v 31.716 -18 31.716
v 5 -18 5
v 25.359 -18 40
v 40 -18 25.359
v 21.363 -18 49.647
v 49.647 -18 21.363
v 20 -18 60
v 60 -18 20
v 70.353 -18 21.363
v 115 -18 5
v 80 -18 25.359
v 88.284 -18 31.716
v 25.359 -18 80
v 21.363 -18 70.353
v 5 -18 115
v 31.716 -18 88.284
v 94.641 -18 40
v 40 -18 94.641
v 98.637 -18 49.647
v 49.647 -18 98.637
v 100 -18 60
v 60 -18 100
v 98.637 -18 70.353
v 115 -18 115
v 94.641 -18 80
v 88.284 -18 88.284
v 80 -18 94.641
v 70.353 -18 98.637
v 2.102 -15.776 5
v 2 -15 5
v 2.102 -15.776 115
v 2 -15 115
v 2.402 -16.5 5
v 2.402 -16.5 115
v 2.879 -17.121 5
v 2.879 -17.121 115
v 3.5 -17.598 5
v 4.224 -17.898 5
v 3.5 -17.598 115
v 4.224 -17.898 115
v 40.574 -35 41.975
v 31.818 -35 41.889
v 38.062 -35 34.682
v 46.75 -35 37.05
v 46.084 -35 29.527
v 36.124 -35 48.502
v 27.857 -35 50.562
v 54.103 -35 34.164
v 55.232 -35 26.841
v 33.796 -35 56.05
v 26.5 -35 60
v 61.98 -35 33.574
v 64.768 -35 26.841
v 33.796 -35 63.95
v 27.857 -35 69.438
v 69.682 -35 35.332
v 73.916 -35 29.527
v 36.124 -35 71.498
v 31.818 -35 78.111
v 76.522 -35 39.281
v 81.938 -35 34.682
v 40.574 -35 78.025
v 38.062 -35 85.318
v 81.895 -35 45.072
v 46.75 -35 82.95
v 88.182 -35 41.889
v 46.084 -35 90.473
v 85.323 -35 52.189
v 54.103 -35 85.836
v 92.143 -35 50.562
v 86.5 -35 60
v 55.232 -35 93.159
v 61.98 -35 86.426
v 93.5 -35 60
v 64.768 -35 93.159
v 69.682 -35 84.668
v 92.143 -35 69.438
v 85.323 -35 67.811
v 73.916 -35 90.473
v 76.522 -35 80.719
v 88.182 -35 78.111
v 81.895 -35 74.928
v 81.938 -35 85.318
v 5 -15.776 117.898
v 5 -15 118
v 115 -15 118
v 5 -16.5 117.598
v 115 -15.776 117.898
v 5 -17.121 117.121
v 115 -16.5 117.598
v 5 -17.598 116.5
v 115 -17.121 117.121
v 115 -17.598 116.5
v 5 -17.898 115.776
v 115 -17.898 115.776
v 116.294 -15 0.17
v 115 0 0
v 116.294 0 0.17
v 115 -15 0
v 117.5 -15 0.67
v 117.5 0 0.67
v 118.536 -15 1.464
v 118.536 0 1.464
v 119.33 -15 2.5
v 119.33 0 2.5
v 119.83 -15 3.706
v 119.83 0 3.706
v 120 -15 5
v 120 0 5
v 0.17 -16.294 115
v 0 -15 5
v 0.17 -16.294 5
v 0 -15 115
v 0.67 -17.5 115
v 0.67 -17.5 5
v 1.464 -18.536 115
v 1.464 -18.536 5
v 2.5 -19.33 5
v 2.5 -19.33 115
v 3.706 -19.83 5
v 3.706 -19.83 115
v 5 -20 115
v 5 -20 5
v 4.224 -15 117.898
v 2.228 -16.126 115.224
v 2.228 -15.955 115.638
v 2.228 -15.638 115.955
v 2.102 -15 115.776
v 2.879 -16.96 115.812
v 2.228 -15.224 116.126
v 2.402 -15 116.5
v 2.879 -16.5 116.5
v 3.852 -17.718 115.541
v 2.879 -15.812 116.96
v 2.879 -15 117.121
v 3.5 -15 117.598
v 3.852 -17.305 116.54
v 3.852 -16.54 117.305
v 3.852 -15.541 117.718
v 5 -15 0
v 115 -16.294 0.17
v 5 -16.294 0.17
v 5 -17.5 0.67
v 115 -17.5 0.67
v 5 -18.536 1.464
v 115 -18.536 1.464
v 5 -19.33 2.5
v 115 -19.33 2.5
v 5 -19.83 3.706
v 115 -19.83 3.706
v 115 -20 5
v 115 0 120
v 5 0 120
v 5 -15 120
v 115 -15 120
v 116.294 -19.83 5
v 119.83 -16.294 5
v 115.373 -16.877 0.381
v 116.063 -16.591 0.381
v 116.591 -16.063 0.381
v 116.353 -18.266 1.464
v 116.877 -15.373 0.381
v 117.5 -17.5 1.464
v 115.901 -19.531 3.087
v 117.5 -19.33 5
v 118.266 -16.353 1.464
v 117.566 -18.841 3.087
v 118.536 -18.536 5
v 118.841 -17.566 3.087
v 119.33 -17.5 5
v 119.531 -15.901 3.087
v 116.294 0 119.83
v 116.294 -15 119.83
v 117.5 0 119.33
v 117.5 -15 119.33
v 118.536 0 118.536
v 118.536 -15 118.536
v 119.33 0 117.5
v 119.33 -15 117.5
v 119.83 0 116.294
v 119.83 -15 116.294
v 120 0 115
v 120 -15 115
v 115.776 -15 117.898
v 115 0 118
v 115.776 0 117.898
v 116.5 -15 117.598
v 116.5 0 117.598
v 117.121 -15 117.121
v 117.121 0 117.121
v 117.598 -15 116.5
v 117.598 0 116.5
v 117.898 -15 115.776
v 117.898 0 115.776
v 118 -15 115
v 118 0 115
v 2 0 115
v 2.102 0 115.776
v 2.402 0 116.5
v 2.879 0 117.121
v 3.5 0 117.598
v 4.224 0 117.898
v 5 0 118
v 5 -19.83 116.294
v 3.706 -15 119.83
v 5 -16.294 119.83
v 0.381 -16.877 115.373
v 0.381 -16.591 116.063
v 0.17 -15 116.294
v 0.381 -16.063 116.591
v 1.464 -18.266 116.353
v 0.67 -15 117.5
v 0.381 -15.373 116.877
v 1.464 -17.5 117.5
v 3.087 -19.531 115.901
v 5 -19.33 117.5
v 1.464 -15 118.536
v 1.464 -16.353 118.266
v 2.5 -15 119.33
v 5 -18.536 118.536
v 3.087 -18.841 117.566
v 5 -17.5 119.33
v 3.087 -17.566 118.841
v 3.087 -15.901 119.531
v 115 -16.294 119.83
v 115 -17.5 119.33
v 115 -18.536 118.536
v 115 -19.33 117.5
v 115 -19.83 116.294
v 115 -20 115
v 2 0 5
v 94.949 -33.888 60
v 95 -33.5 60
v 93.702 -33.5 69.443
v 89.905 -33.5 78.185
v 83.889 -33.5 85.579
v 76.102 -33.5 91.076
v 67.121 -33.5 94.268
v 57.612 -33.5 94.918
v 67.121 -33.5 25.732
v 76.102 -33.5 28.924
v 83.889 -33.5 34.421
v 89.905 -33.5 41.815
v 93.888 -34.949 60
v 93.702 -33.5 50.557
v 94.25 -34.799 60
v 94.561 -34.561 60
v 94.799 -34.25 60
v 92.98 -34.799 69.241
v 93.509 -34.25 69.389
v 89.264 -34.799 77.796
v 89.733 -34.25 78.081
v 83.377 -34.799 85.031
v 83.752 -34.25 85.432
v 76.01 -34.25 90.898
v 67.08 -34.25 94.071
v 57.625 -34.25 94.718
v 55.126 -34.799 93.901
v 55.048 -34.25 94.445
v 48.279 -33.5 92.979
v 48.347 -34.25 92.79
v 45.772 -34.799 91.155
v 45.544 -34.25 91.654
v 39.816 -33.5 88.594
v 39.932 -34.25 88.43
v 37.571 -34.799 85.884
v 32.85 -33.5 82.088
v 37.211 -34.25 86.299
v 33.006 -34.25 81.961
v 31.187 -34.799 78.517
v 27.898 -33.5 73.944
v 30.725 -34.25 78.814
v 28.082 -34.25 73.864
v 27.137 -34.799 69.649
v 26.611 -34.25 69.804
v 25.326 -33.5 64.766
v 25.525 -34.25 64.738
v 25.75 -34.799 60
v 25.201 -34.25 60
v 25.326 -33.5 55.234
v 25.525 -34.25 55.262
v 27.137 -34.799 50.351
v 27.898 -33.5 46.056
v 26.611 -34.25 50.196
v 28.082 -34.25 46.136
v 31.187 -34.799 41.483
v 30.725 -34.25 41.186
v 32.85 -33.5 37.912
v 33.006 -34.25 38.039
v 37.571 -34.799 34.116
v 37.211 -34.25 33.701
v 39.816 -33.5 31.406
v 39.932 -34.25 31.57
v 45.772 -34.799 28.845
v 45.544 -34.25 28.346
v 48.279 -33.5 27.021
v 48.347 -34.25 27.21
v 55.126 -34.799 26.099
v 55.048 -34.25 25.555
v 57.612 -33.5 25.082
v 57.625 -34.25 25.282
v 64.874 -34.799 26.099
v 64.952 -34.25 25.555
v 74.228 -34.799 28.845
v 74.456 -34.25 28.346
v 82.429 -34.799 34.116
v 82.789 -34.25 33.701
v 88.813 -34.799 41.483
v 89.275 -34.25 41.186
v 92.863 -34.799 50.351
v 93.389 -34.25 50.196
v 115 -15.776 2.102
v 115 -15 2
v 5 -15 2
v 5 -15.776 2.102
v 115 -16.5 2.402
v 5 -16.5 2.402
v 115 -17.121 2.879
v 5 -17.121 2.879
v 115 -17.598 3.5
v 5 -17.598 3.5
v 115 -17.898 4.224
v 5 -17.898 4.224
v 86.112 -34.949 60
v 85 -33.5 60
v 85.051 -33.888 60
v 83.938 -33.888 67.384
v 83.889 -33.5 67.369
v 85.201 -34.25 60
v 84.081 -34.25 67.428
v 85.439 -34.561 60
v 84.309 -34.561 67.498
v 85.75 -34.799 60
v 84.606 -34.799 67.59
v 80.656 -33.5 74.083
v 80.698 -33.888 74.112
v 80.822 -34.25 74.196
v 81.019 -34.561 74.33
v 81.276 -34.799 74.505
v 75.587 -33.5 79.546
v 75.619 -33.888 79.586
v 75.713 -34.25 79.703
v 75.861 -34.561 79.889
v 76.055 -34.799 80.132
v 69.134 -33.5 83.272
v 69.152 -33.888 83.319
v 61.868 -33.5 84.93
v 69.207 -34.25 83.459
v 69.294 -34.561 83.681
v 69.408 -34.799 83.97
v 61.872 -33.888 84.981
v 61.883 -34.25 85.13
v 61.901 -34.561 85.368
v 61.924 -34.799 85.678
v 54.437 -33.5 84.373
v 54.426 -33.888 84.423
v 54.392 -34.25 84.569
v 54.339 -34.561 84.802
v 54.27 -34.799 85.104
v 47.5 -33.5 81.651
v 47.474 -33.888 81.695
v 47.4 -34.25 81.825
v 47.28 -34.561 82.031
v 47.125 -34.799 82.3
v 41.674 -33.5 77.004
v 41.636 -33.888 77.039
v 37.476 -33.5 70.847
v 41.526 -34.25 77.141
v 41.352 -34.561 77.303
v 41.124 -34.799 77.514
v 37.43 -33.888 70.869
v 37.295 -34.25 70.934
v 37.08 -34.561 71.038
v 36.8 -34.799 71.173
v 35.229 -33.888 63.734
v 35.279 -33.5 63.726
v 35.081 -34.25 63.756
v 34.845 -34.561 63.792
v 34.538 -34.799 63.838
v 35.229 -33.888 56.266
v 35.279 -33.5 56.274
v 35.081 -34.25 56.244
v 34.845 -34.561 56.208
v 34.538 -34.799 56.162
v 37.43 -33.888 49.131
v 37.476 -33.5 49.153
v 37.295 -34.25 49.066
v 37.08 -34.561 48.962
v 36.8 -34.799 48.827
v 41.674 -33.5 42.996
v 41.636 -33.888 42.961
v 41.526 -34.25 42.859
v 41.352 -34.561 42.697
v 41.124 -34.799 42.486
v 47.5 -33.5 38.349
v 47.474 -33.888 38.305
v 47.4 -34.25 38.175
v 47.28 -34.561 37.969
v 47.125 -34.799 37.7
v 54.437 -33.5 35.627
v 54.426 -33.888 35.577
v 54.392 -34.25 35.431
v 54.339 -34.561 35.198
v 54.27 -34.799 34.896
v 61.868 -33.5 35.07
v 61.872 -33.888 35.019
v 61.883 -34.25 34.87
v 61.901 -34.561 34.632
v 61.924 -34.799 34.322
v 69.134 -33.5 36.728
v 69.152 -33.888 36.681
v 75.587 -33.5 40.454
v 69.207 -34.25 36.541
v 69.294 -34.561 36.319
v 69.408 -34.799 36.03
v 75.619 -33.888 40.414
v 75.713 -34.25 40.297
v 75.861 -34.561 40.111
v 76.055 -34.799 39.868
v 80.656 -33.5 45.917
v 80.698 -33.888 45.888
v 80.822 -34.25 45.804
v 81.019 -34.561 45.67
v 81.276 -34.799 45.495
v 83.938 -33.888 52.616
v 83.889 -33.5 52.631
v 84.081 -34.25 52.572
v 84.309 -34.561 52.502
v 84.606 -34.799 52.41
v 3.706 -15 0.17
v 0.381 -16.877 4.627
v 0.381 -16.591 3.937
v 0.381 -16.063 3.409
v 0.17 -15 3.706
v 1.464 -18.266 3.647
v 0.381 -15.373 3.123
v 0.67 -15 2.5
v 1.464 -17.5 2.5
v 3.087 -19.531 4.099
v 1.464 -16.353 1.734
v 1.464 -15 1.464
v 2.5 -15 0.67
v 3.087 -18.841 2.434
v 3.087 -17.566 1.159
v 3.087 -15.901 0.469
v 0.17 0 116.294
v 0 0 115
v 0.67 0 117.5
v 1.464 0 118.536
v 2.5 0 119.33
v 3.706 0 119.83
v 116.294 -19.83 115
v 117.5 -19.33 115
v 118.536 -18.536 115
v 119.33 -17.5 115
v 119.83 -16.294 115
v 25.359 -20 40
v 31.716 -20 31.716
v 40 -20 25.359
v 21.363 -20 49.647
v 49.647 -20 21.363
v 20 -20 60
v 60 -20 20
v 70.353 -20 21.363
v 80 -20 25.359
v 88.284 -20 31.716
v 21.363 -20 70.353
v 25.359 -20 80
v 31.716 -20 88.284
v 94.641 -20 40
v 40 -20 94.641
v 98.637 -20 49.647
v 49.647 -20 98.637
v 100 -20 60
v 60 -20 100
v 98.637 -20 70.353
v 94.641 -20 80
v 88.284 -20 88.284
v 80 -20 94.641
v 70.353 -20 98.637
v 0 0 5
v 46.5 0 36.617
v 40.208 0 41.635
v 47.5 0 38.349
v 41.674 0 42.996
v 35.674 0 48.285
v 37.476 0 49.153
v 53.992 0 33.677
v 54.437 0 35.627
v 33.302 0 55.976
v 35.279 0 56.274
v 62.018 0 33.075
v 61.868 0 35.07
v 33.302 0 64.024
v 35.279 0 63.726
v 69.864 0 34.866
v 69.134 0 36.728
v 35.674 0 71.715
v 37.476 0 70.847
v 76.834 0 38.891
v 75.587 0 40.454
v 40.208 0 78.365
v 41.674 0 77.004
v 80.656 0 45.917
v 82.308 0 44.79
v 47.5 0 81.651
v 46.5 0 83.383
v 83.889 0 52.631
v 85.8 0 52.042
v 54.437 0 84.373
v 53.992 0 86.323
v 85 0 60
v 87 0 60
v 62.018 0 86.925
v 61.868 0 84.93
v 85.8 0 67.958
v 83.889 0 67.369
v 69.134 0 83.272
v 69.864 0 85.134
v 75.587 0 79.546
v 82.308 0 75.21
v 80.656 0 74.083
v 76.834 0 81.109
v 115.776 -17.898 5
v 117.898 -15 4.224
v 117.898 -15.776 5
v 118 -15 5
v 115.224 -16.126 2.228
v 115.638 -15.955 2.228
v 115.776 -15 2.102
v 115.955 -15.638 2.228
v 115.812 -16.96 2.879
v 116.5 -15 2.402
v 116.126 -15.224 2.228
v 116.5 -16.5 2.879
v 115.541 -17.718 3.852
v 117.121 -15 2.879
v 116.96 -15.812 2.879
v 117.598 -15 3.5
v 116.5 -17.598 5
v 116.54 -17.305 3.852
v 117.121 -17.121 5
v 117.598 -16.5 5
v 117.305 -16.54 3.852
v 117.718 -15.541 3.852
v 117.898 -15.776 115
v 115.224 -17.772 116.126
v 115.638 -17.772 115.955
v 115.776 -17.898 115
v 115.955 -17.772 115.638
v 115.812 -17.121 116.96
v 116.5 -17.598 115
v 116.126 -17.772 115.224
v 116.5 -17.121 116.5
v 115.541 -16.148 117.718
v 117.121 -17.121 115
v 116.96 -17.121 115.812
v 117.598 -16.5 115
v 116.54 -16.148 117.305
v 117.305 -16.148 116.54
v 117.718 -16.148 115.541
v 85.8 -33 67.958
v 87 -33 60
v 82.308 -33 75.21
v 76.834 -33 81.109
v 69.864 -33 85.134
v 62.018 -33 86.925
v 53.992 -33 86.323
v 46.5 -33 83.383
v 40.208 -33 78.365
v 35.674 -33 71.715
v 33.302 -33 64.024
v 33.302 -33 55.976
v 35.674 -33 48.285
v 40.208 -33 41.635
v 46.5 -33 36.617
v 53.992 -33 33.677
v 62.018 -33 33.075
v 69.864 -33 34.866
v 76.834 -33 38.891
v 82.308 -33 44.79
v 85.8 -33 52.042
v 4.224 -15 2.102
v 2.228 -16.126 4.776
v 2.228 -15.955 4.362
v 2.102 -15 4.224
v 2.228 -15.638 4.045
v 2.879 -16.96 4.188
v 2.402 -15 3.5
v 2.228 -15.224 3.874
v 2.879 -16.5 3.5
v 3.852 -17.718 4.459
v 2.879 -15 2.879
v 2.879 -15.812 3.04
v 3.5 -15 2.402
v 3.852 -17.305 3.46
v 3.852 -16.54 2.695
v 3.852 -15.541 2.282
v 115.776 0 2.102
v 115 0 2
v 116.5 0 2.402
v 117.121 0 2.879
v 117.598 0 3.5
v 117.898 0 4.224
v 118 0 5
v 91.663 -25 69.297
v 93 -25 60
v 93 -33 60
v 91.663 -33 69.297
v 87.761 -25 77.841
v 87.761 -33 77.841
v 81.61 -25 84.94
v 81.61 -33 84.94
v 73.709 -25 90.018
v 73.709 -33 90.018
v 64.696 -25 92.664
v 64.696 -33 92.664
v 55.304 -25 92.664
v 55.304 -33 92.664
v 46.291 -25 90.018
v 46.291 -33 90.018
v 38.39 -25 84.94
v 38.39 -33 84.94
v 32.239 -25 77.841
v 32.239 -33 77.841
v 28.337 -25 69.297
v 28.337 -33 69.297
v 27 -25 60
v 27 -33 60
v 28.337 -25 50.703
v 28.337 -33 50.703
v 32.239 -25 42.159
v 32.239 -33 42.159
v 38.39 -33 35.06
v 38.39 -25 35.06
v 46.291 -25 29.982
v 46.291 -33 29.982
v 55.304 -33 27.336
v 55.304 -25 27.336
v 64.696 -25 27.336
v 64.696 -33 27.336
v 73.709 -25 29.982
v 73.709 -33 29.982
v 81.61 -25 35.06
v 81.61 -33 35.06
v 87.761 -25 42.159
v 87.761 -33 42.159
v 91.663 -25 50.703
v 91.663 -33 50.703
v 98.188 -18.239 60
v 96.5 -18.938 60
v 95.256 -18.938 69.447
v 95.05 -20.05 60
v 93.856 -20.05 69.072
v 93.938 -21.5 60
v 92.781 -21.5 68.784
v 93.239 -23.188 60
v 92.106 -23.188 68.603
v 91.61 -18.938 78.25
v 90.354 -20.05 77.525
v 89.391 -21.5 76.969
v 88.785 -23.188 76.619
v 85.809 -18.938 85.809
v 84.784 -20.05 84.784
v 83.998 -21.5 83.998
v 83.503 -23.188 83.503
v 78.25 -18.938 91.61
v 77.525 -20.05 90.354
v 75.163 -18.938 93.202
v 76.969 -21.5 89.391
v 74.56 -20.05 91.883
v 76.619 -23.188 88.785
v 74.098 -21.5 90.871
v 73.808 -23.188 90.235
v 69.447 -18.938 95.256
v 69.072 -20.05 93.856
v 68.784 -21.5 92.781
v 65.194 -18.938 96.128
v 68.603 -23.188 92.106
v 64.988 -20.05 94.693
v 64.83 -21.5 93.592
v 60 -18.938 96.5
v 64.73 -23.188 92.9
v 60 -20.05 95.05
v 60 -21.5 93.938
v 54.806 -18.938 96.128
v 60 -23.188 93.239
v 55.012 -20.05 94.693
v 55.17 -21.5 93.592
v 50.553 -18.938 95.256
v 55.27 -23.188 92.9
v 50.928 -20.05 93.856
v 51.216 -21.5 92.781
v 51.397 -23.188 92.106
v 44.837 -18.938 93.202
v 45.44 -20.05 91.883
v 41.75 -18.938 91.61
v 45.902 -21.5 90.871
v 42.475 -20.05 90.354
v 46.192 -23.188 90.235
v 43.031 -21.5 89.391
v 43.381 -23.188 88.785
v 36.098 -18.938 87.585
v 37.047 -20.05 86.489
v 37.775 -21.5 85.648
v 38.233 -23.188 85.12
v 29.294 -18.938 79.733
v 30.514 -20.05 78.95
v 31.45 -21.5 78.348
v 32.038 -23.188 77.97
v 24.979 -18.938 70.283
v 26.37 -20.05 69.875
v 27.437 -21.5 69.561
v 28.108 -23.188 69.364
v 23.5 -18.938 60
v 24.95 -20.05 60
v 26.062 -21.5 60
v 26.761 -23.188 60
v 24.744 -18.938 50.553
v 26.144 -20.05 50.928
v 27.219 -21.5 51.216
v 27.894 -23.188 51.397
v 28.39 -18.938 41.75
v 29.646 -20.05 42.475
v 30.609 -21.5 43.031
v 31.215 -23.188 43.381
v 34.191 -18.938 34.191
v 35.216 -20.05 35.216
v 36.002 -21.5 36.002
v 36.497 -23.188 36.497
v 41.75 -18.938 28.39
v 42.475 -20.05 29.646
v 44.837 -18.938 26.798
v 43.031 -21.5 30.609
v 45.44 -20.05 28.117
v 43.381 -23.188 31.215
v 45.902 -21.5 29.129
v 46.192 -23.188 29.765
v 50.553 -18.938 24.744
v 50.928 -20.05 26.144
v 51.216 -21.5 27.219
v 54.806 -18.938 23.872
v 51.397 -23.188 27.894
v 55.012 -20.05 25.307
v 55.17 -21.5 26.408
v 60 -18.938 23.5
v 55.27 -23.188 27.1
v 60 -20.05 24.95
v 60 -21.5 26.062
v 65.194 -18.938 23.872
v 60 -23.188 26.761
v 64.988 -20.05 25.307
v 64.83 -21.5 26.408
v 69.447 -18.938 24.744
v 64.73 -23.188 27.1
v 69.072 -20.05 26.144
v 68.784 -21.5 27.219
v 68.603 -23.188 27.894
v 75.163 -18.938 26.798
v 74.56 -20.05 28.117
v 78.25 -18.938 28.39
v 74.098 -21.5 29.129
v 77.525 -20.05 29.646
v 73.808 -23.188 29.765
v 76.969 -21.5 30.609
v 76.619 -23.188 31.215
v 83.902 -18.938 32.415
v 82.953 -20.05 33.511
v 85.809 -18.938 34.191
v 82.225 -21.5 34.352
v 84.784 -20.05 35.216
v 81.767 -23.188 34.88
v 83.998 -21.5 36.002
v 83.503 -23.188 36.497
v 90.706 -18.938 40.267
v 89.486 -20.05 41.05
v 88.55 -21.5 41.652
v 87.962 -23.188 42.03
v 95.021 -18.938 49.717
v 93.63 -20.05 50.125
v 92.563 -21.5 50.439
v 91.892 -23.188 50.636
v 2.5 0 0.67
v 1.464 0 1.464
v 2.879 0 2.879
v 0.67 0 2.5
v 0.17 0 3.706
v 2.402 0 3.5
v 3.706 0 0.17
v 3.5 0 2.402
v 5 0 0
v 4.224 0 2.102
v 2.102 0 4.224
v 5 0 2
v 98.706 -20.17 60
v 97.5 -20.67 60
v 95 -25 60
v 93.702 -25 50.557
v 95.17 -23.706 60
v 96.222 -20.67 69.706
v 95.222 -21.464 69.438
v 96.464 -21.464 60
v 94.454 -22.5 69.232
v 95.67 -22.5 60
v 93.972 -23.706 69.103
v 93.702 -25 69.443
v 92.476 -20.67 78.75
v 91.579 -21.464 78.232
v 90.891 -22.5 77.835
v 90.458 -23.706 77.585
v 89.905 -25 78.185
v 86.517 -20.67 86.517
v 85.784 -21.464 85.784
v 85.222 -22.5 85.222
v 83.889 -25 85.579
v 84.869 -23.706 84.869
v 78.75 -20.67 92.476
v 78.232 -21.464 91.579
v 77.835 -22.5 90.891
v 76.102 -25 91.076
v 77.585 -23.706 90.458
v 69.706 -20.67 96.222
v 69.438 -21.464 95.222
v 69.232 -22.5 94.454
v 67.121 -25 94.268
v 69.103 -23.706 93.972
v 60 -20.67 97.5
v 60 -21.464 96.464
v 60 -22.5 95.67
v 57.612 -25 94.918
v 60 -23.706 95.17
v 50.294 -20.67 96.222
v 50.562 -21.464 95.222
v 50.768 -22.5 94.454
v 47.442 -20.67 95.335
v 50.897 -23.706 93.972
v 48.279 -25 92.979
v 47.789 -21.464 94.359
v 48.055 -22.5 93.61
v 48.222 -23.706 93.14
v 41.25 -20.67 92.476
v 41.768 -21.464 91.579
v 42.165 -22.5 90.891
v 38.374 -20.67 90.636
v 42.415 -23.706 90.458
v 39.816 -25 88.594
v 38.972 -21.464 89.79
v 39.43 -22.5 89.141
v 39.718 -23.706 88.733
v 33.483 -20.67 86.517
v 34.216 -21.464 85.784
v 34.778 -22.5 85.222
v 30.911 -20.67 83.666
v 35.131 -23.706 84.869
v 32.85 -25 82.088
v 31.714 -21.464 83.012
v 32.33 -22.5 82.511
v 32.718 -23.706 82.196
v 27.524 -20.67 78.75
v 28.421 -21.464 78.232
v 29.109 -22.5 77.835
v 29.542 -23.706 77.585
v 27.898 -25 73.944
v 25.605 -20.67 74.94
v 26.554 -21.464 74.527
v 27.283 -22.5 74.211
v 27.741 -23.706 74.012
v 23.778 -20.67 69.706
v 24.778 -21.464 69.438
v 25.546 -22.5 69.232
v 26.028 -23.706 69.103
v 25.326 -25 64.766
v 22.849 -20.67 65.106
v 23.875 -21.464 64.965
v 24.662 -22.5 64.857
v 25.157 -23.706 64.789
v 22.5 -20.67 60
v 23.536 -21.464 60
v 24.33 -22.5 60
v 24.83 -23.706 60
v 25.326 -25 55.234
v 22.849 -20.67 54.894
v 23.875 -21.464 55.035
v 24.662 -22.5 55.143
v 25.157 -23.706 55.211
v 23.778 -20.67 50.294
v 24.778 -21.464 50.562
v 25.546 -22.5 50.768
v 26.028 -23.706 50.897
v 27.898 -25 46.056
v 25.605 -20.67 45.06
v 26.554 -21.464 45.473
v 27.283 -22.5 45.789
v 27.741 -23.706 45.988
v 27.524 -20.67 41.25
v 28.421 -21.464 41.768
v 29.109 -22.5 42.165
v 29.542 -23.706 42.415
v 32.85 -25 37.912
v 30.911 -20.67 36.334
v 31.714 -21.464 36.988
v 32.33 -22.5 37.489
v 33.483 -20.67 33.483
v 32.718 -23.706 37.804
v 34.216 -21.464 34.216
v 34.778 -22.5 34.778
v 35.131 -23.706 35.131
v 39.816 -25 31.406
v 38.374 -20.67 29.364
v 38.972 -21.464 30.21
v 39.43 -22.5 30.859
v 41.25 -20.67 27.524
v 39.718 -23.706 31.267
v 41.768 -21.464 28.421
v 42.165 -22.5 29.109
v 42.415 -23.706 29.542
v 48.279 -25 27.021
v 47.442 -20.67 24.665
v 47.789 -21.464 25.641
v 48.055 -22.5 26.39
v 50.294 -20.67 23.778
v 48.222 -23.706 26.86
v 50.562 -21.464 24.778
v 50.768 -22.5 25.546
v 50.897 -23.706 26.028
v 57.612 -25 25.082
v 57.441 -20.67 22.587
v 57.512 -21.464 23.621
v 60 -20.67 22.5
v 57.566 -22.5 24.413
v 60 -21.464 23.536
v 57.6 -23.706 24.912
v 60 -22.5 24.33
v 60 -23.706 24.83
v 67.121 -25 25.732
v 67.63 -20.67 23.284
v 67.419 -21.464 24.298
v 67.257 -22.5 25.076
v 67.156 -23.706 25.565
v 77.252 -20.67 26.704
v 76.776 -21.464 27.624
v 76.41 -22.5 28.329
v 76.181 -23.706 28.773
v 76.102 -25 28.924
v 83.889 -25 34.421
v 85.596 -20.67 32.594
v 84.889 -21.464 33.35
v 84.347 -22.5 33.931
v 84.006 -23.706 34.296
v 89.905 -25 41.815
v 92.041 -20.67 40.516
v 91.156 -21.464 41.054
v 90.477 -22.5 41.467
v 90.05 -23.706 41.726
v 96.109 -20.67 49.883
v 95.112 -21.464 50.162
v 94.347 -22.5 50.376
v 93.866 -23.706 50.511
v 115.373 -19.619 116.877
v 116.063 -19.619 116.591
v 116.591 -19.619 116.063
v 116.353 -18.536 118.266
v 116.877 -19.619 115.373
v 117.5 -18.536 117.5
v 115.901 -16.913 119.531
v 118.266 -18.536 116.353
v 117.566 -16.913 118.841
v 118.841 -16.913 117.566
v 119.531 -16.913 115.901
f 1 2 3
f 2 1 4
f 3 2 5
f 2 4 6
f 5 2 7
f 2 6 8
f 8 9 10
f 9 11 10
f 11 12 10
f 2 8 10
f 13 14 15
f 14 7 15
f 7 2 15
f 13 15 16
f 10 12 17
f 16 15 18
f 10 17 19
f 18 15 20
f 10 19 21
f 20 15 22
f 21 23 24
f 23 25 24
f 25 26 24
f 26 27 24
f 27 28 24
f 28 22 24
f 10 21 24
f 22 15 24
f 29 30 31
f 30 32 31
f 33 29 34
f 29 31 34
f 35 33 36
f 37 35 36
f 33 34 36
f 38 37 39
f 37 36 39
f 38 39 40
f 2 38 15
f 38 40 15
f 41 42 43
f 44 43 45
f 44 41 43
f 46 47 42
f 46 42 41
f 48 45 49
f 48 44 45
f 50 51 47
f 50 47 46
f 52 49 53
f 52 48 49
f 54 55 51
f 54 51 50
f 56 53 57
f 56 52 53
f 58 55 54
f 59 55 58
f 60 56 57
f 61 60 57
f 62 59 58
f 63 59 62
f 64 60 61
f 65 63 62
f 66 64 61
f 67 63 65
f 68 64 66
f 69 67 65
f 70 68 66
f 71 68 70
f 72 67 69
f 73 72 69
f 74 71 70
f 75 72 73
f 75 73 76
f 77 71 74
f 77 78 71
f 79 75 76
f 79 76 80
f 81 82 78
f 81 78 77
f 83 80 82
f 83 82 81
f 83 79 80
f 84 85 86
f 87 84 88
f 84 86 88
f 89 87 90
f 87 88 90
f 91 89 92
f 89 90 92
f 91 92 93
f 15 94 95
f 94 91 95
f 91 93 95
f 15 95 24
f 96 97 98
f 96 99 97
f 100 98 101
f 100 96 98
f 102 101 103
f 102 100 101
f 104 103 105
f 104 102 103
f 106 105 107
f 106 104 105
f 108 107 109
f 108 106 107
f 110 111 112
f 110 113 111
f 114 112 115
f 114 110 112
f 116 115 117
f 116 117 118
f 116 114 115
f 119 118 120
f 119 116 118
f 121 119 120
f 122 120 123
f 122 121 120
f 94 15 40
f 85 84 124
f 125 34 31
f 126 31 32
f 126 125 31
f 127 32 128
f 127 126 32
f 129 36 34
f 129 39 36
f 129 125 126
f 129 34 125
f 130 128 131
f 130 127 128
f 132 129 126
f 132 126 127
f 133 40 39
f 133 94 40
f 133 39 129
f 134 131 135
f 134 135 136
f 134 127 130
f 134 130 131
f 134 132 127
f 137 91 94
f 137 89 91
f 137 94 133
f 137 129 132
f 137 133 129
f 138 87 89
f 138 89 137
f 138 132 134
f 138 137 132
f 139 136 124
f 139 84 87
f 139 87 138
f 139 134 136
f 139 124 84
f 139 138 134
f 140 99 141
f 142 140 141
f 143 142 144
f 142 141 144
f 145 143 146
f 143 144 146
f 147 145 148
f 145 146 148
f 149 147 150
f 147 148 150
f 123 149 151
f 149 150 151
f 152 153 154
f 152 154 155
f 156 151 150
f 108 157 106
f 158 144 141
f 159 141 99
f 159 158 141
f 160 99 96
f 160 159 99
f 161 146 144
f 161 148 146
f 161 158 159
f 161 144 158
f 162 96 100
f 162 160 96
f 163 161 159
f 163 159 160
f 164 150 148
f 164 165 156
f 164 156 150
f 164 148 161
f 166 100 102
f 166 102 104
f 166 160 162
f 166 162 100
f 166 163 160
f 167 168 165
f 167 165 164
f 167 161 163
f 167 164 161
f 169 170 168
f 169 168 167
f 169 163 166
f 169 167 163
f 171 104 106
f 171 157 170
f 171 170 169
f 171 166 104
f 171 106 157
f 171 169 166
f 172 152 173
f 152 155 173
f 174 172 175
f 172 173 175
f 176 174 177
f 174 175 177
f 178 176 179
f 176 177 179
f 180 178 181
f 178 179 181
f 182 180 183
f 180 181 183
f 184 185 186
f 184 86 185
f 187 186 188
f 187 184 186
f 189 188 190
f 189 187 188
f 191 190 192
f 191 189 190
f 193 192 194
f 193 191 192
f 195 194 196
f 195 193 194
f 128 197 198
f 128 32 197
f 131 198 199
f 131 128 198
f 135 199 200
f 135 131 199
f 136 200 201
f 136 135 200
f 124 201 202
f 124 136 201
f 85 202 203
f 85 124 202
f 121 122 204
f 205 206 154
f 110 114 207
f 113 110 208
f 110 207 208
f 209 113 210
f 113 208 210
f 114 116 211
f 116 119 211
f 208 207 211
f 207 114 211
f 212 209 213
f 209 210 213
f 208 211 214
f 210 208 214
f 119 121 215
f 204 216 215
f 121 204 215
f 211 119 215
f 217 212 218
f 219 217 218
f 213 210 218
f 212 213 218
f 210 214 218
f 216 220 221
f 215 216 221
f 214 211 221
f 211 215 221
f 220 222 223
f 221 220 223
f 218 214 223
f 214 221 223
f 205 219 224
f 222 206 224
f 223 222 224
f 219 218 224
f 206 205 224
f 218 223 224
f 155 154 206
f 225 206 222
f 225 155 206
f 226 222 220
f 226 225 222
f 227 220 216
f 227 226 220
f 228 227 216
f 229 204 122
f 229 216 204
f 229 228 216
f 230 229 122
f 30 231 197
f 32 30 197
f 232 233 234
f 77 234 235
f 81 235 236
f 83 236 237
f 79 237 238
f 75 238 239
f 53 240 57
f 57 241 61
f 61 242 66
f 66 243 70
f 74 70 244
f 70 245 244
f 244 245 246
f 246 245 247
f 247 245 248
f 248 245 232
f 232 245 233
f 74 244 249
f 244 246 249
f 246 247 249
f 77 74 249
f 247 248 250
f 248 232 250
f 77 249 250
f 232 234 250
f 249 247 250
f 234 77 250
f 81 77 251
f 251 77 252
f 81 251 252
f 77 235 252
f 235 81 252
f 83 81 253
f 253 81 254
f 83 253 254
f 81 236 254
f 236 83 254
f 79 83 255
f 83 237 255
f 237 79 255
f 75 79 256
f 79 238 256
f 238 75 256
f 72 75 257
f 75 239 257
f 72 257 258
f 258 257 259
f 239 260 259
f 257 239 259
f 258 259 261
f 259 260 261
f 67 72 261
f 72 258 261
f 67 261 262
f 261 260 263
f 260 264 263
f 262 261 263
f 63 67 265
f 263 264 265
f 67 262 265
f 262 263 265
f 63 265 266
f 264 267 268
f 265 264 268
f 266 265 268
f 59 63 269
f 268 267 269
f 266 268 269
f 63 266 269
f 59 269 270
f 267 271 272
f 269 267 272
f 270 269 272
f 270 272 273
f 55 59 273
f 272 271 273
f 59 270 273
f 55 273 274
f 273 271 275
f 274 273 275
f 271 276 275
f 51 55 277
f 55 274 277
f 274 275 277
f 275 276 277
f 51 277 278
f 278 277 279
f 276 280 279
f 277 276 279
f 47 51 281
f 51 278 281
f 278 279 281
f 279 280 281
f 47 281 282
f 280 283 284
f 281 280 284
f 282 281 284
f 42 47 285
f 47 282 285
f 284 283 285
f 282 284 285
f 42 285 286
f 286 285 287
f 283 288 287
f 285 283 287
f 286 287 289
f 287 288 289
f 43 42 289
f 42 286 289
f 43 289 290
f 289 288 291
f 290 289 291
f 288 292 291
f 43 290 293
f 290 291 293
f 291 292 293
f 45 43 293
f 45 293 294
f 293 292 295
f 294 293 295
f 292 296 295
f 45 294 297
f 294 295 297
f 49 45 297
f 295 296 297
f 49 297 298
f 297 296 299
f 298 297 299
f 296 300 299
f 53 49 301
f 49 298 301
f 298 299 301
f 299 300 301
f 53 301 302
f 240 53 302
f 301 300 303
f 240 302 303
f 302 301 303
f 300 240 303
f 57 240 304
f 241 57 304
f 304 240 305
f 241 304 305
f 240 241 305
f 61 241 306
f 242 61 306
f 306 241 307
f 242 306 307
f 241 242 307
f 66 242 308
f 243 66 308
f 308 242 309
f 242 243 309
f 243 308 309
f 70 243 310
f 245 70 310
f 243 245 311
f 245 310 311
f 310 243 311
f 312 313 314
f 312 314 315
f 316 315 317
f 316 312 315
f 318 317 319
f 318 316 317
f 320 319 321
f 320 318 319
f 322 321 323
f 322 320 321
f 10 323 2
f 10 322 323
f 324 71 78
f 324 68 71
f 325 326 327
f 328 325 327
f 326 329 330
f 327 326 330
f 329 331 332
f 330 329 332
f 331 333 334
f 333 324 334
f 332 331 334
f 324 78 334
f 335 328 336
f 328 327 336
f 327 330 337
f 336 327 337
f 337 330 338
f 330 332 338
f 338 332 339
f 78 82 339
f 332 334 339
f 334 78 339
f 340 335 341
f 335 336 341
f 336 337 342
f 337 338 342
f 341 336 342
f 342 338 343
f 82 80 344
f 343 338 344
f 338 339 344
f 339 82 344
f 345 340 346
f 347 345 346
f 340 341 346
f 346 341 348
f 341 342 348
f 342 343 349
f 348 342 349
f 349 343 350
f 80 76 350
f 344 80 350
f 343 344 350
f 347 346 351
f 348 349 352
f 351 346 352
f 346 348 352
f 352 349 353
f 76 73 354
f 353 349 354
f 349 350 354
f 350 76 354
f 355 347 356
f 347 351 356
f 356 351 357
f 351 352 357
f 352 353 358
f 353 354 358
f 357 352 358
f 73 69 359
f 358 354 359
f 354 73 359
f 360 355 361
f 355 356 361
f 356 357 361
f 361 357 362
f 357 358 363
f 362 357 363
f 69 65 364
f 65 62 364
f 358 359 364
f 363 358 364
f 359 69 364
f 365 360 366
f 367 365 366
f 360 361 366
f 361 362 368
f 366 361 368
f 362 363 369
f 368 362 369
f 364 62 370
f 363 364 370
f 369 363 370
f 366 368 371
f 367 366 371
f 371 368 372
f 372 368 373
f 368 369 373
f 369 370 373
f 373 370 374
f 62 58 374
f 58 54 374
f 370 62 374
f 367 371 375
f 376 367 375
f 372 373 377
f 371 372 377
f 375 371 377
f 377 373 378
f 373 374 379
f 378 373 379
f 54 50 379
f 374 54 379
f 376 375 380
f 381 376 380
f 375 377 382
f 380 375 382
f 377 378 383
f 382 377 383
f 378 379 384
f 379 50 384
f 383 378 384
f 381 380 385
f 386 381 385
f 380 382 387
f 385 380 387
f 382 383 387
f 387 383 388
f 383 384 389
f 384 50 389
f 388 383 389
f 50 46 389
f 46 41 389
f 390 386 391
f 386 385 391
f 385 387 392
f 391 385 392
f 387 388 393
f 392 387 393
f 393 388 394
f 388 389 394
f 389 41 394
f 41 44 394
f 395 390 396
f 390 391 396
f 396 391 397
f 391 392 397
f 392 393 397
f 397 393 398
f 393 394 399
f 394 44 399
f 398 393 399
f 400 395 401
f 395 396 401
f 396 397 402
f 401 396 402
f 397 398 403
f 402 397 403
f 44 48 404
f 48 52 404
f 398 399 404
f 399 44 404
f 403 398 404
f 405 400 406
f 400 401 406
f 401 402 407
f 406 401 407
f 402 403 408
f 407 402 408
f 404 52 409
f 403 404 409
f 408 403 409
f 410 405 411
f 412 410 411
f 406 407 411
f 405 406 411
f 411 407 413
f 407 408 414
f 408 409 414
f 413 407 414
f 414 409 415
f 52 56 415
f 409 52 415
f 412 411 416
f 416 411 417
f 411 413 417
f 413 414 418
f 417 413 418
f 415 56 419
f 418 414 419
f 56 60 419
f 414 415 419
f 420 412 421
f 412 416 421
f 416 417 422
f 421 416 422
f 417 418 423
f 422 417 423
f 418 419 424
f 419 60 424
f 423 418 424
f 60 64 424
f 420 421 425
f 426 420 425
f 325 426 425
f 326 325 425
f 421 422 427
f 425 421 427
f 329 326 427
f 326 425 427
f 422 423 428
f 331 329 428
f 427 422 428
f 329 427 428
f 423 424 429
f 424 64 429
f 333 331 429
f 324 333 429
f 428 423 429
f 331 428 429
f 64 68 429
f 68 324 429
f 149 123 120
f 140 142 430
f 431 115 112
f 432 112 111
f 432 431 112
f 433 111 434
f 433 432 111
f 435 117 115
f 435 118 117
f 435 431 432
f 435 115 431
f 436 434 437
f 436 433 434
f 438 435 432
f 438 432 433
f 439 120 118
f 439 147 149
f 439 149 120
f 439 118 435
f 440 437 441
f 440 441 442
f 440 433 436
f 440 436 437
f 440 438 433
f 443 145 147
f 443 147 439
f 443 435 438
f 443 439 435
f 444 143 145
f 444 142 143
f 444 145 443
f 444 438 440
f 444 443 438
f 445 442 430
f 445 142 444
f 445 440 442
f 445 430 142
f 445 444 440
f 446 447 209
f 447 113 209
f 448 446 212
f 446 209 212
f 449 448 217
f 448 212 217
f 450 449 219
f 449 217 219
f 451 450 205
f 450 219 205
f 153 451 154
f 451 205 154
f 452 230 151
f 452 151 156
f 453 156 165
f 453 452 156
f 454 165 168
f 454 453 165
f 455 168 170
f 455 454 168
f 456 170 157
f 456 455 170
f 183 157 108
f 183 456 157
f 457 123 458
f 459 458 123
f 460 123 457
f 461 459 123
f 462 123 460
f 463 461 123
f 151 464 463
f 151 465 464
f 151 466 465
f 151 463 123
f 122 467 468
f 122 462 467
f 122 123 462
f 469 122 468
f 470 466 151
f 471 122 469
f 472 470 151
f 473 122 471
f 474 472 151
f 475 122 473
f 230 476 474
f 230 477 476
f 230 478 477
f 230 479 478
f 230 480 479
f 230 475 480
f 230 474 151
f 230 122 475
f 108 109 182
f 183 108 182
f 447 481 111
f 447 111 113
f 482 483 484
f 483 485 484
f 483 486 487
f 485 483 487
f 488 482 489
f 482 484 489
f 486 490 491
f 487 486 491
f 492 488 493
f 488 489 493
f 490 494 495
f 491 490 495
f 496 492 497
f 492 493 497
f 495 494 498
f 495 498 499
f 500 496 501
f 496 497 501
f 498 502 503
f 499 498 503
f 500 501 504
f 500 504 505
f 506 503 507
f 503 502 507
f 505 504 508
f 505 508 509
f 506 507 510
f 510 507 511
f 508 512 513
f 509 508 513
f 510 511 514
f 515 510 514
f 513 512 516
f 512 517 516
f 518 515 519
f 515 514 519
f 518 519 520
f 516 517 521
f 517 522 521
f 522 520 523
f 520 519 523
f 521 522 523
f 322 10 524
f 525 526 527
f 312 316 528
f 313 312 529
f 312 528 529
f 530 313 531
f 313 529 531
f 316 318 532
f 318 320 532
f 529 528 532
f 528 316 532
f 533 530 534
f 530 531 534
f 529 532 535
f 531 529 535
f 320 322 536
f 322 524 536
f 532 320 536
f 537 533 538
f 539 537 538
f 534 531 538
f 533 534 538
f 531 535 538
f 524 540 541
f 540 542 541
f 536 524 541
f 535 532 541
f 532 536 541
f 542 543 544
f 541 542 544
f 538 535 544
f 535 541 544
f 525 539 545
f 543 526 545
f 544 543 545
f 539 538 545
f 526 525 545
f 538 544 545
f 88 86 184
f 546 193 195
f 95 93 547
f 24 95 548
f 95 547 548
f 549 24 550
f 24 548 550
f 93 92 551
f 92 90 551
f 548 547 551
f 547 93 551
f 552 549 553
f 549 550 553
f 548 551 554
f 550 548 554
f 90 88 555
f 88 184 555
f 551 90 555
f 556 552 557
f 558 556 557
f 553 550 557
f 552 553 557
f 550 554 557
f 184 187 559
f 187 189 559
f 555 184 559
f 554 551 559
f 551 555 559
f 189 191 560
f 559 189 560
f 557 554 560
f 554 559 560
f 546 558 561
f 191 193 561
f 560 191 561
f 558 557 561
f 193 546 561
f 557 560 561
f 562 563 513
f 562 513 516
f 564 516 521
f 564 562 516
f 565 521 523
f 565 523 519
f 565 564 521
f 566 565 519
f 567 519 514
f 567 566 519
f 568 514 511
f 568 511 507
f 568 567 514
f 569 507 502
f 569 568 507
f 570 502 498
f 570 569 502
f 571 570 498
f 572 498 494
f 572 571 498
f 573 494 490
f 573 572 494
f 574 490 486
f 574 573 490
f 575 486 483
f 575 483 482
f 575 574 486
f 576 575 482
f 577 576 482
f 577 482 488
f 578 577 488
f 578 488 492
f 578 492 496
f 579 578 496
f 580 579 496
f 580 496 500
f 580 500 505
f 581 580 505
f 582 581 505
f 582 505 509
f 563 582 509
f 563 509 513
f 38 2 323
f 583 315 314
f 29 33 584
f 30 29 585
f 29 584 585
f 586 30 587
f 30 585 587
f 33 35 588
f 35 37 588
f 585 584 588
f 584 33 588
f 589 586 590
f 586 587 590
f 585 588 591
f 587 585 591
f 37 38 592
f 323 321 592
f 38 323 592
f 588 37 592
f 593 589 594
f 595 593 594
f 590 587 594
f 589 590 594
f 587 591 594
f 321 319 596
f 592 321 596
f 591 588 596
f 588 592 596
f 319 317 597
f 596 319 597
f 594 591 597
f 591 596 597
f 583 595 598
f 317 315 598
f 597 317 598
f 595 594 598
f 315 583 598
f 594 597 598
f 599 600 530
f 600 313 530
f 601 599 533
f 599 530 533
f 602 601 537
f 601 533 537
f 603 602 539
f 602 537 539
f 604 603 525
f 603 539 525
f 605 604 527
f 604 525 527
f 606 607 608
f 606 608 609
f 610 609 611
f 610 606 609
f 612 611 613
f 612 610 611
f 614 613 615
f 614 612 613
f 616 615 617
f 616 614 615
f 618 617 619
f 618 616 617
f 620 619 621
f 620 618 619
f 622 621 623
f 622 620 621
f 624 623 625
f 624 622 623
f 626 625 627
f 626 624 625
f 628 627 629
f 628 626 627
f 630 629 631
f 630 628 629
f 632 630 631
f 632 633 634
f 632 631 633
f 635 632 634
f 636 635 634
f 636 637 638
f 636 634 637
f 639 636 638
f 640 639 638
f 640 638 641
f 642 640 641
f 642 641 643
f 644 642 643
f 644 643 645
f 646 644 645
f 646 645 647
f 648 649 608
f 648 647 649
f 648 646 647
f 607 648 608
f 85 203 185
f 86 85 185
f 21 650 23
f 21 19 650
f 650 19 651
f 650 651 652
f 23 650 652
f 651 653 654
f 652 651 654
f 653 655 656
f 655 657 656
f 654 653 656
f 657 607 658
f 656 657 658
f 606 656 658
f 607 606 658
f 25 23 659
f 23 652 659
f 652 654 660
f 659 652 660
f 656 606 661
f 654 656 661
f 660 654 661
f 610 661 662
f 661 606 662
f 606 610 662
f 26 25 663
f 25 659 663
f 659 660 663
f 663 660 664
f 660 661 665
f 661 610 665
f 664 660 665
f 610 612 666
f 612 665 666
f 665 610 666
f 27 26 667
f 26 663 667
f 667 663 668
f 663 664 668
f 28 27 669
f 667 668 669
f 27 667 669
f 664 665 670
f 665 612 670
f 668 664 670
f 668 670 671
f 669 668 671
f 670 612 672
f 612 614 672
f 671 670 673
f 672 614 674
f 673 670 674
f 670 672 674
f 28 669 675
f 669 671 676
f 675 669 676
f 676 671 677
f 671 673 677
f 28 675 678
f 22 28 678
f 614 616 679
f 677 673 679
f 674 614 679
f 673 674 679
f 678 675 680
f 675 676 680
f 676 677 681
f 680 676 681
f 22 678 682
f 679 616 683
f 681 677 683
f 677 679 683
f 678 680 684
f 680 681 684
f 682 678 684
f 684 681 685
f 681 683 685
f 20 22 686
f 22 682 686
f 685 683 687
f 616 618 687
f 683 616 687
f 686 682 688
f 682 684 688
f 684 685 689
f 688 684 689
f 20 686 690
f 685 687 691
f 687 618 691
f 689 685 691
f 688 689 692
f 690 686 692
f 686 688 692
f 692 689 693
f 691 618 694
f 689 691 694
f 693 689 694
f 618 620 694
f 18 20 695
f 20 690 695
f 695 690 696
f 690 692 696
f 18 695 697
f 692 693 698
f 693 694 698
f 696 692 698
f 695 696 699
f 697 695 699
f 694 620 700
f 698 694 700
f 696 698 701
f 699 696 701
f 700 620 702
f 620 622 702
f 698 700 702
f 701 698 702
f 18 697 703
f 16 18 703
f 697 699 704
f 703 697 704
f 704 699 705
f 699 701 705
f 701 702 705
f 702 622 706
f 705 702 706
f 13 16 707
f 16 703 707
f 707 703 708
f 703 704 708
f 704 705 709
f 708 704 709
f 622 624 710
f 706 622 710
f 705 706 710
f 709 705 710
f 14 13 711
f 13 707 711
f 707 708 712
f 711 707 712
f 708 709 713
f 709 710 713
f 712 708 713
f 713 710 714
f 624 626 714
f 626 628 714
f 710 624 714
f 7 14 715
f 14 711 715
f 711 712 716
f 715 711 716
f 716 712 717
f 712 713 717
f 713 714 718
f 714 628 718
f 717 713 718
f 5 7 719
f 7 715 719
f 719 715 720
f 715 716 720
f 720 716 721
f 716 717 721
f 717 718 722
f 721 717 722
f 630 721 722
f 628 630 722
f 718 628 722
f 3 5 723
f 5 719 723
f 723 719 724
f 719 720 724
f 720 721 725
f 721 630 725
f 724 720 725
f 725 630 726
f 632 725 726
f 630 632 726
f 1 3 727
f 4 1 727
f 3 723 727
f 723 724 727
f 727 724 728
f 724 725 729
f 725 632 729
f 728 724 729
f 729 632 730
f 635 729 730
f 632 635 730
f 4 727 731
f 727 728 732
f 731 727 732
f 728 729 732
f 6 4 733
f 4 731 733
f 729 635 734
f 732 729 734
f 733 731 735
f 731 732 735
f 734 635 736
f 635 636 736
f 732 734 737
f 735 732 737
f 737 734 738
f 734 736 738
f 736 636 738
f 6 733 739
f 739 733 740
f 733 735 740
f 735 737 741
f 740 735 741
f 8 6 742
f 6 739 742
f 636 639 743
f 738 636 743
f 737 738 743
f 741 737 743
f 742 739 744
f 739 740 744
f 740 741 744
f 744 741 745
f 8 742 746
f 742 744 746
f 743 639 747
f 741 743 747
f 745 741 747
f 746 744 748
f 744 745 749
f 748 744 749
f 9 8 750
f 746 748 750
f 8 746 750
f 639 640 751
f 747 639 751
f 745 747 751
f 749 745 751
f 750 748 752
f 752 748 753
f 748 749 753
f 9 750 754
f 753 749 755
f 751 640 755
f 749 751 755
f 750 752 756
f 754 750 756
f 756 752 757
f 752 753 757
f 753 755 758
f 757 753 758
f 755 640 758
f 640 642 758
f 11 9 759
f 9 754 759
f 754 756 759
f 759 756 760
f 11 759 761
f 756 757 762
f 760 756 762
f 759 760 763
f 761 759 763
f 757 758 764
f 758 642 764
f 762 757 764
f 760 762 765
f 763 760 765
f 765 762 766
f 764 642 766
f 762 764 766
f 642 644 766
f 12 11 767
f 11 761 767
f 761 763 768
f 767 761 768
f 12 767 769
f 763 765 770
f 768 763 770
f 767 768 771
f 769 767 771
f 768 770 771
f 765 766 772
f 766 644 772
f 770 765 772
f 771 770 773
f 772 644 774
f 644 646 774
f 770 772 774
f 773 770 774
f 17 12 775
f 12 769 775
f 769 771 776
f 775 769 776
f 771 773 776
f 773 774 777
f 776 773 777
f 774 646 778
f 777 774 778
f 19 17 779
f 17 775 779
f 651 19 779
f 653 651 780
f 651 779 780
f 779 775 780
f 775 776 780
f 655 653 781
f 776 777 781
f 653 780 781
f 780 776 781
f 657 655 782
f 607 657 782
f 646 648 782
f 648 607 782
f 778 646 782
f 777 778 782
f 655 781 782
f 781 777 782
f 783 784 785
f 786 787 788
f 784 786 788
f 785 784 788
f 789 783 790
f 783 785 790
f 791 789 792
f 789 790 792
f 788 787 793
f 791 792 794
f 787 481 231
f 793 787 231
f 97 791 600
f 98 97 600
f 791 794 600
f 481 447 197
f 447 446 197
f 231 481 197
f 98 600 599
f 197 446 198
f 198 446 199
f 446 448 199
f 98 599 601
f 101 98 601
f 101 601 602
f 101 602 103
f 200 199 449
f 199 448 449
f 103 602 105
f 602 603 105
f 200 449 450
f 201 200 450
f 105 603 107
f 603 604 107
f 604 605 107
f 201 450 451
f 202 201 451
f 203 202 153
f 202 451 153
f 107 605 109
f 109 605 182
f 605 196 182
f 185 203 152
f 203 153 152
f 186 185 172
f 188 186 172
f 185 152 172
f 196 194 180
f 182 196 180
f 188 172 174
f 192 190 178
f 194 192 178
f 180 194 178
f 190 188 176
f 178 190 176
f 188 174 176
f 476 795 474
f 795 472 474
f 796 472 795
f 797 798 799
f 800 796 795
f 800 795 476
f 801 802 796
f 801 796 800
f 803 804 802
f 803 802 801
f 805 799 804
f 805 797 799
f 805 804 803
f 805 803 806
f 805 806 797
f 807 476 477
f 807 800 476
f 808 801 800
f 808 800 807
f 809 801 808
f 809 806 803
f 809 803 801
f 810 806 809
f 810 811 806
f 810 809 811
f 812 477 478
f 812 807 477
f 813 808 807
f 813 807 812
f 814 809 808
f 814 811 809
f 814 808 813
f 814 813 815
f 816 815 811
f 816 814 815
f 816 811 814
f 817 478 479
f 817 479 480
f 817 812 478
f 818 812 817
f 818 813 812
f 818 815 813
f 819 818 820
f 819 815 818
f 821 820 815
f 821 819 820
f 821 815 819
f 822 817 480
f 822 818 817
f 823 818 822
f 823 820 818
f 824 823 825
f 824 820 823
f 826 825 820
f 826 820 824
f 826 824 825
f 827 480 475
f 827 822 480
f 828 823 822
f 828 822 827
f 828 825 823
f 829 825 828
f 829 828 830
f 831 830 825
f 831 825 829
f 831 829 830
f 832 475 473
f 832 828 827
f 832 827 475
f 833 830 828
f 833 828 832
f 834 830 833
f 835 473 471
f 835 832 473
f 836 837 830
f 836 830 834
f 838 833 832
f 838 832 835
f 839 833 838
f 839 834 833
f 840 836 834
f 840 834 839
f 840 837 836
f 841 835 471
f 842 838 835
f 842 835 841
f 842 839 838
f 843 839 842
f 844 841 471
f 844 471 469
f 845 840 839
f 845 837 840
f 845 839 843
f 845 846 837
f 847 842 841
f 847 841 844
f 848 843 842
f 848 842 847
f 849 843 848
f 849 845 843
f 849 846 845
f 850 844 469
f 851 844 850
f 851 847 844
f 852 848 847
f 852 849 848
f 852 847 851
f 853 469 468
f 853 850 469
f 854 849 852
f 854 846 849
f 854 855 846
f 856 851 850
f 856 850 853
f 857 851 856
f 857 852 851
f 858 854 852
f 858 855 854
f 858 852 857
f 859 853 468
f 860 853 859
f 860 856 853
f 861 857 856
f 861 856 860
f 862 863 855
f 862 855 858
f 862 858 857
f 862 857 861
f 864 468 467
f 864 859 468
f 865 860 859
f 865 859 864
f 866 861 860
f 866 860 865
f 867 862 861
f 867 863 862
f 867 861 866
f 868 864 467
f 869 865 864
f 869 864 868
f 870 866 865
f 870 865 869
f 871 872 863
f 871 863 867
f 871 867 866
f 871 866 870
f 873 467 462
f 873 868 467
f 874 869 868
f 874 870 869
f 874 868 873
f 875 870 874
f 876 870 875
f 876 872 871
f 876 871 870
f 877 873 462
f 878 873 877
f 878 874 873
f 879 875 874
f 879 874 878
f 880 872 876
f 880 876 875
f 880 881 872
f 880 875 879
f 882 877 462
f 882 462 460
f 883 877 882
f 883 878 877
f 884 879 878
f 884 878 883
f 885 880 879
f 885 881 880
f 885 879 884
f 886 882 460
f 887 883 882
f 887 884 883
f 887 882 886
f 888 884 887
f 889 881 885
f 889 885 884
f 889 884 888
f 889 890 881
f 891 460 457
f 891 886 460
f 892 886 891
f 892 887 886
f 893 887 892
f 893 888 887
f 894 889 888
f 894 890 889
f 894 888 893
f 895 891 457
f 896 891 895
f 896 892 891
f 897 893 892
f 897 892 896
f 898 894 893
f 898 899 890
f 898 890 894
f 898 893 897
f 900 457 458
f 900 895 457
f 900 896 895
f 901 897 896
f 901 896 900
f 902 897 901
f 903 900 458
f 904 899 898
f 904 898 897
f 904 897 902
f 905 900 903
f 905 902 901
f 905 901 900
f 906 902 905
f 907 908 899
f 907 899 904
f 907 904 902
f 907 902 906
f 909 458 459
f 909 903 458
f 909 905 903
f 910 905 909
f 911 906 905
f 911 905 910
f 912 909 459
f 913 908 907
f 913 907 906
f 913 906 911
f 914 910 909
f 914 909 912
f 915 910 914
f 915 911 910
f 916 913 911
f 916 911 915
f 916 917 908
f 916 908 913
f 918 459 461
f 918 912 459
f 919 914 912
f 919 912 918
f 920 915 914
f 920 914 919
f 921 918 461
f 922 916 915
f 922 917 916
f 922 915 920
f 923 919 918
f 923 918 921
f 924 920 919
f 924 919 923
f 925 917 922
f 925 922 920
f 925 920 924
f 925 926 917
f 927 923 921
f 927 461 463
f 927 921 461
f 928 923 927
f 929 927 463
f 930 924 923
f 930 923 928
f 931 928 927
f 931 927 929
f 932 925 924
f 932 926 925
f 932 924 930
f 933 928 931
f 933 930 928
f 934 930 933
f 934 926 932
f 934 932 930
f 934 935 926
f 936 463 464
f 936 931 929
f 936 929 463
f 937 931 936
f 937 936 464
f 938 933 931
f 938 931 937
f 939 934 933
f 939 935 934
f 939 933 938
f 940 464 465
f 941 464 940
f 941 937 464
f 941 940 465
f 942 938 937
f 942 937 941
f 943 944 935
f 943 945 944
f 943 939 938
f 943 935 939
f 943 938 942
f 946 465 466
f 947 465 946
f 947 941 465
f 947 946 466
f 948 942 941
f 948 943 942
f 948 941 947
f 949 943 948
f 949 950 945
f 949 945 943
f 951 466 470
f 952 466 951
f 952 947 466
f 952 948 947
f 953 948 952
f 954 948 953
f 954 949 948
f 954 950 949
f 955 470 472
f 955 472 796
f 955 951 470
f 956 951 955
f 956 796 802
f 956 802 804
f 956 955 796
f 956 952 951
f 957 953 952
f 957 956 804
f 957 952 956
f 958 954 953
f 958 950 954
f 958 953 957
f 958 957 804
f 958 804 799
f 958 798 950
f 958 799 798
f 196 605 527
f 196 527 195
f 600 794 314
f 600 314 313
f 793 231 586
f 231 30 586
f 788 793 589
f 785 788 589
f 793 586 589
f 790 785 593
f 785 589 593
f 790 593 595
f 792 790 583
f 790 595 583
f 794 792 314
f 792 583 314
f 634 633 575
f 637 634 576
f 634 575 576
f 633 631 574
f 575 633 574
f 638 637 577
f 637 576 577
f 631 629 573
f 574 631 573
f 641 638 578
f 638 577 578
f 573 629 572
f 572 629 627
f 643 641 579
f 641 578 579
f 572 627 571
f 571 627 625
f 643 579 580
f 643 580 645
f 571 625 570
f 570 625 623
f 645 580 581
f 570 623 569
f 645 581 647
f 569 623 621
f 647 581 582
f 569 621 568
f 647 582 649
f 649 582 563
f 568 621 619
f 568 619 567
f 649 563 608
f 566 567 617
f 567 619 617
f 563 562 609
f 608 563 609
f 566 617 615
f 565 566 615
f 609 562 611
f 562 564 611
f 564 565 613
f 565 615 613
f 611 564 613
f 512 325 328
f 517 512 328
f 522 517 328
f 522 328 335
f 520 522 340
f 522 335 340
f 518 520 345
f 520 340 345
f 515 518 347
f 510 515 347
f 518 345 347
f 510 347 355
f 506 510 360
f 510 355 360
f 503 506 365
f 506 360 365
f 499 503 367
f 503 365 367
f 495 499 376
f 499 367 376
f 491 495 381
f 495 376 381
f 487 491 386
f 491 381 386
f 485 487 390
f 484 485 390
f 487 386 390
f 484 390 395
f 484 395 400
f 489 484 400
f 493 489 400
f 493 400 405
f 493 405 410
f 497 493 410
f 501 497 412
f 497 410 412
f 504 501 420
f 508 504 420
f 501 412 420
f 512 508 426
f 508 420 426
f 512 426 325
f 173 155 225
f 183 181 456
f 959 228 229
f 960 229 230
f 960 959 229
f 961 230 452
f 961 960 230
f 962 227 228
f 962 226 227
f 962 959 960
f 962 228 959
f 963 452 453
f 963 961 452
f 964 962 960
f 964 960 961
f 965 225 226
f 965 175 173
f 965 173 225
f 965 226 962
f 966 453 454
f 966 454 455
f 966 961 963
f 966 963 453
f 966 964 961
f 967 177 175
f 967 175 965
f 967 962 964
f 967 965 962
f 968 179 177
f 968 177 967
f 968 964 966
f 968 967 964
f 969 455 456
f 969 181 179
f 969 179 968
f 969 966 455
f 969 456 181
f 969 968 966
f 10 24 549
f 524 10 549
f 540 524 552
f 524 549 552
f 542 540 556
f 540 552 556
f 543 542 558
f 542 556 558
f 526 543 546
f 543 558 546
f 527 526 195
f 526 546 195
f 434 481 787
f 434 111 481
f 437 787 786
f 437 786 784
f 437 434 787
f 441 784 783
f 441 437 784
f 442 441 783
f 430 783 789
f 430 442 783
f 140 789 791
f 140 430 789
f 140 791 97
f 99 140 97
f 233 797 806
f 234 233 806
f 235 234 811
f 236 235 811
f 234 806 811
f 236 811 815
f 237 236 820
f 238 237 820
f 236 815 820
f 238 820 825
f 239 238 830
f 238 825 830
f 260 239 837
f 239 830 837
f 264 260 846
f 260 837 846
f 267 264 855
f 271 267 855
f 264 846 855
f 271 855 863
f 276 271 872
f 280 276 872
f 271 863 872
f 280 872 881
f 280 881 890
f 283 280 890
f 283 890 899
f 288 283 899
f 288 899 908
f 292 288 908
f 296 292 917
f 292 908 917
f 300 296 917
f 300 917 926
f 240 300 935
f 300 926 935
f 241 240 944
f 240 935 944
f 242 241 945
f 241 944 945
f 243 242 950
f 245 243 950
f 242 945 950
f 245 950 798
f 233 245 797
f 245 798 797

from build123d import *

# Parameters (mm, degrees)
F4_W     = 120
F4_H     = 120
F0_DEPTH = 20
F5_R     = 35
F1_DEPTH = 15
F2_R     = 25
F6_DEPTH = 35
F3_R     = 5
F7_R     = 1.5
F8_T     = -2


with BuildPart() as f0:
    # F4 (on Front) → F0 (new body)
    with BuildSketch(Plane.XZ):
        with Locations((60, 60)):
            Rectangle(F4_W, F4_H)
    extrude(amount=F0_DEPTH)

    # F5 (on face) → F1 (join)
    with BuildSketch(Plane.XZ.offset(20)):
        with Locations((60, 60)):
            Circle(F5_R)
    extrude(amount=F1_DEPTH)

    # F2 (on face) → F6 (cut, through all)
    with BuildSketch(Plane.XZ.offset(35)):
        with Locations((60, 60)):
            Circle(F2_R)
    extrude(amount=-F6_DEPTH, mode=Mode.SUBTRACT)

    # F3
    f3_edges = [f0.edges().sort_by_distance(p)[0] for p in [
        (120, -10, 120),
        (60, -20, 120),
        (120, -20, 60),
        (60, -20, 0),
        (0, -20, 60),
        (0, -10, 120),
        (0, -10, 0),
        (120, -10, 0),
        (25, -20, 60),
    ]]
    fillet(f3_edges, radius=F3_R)

    # F7
    f7_edges = [f0.edges().sort_by_distance(p)[0] for p in [
        (25, -35, 60),
        (35, -35, 60),
    ]]
    fillet(f7_edges, radius=F7_R)

    # F8
    f8_openings = [f0.faces().sort_by_distance(p)[0] for p in [
        (1.697056, 0, 60),
    ]]
    offset(amount=F8_T, openings=f8_openings)


solid = f0.part
